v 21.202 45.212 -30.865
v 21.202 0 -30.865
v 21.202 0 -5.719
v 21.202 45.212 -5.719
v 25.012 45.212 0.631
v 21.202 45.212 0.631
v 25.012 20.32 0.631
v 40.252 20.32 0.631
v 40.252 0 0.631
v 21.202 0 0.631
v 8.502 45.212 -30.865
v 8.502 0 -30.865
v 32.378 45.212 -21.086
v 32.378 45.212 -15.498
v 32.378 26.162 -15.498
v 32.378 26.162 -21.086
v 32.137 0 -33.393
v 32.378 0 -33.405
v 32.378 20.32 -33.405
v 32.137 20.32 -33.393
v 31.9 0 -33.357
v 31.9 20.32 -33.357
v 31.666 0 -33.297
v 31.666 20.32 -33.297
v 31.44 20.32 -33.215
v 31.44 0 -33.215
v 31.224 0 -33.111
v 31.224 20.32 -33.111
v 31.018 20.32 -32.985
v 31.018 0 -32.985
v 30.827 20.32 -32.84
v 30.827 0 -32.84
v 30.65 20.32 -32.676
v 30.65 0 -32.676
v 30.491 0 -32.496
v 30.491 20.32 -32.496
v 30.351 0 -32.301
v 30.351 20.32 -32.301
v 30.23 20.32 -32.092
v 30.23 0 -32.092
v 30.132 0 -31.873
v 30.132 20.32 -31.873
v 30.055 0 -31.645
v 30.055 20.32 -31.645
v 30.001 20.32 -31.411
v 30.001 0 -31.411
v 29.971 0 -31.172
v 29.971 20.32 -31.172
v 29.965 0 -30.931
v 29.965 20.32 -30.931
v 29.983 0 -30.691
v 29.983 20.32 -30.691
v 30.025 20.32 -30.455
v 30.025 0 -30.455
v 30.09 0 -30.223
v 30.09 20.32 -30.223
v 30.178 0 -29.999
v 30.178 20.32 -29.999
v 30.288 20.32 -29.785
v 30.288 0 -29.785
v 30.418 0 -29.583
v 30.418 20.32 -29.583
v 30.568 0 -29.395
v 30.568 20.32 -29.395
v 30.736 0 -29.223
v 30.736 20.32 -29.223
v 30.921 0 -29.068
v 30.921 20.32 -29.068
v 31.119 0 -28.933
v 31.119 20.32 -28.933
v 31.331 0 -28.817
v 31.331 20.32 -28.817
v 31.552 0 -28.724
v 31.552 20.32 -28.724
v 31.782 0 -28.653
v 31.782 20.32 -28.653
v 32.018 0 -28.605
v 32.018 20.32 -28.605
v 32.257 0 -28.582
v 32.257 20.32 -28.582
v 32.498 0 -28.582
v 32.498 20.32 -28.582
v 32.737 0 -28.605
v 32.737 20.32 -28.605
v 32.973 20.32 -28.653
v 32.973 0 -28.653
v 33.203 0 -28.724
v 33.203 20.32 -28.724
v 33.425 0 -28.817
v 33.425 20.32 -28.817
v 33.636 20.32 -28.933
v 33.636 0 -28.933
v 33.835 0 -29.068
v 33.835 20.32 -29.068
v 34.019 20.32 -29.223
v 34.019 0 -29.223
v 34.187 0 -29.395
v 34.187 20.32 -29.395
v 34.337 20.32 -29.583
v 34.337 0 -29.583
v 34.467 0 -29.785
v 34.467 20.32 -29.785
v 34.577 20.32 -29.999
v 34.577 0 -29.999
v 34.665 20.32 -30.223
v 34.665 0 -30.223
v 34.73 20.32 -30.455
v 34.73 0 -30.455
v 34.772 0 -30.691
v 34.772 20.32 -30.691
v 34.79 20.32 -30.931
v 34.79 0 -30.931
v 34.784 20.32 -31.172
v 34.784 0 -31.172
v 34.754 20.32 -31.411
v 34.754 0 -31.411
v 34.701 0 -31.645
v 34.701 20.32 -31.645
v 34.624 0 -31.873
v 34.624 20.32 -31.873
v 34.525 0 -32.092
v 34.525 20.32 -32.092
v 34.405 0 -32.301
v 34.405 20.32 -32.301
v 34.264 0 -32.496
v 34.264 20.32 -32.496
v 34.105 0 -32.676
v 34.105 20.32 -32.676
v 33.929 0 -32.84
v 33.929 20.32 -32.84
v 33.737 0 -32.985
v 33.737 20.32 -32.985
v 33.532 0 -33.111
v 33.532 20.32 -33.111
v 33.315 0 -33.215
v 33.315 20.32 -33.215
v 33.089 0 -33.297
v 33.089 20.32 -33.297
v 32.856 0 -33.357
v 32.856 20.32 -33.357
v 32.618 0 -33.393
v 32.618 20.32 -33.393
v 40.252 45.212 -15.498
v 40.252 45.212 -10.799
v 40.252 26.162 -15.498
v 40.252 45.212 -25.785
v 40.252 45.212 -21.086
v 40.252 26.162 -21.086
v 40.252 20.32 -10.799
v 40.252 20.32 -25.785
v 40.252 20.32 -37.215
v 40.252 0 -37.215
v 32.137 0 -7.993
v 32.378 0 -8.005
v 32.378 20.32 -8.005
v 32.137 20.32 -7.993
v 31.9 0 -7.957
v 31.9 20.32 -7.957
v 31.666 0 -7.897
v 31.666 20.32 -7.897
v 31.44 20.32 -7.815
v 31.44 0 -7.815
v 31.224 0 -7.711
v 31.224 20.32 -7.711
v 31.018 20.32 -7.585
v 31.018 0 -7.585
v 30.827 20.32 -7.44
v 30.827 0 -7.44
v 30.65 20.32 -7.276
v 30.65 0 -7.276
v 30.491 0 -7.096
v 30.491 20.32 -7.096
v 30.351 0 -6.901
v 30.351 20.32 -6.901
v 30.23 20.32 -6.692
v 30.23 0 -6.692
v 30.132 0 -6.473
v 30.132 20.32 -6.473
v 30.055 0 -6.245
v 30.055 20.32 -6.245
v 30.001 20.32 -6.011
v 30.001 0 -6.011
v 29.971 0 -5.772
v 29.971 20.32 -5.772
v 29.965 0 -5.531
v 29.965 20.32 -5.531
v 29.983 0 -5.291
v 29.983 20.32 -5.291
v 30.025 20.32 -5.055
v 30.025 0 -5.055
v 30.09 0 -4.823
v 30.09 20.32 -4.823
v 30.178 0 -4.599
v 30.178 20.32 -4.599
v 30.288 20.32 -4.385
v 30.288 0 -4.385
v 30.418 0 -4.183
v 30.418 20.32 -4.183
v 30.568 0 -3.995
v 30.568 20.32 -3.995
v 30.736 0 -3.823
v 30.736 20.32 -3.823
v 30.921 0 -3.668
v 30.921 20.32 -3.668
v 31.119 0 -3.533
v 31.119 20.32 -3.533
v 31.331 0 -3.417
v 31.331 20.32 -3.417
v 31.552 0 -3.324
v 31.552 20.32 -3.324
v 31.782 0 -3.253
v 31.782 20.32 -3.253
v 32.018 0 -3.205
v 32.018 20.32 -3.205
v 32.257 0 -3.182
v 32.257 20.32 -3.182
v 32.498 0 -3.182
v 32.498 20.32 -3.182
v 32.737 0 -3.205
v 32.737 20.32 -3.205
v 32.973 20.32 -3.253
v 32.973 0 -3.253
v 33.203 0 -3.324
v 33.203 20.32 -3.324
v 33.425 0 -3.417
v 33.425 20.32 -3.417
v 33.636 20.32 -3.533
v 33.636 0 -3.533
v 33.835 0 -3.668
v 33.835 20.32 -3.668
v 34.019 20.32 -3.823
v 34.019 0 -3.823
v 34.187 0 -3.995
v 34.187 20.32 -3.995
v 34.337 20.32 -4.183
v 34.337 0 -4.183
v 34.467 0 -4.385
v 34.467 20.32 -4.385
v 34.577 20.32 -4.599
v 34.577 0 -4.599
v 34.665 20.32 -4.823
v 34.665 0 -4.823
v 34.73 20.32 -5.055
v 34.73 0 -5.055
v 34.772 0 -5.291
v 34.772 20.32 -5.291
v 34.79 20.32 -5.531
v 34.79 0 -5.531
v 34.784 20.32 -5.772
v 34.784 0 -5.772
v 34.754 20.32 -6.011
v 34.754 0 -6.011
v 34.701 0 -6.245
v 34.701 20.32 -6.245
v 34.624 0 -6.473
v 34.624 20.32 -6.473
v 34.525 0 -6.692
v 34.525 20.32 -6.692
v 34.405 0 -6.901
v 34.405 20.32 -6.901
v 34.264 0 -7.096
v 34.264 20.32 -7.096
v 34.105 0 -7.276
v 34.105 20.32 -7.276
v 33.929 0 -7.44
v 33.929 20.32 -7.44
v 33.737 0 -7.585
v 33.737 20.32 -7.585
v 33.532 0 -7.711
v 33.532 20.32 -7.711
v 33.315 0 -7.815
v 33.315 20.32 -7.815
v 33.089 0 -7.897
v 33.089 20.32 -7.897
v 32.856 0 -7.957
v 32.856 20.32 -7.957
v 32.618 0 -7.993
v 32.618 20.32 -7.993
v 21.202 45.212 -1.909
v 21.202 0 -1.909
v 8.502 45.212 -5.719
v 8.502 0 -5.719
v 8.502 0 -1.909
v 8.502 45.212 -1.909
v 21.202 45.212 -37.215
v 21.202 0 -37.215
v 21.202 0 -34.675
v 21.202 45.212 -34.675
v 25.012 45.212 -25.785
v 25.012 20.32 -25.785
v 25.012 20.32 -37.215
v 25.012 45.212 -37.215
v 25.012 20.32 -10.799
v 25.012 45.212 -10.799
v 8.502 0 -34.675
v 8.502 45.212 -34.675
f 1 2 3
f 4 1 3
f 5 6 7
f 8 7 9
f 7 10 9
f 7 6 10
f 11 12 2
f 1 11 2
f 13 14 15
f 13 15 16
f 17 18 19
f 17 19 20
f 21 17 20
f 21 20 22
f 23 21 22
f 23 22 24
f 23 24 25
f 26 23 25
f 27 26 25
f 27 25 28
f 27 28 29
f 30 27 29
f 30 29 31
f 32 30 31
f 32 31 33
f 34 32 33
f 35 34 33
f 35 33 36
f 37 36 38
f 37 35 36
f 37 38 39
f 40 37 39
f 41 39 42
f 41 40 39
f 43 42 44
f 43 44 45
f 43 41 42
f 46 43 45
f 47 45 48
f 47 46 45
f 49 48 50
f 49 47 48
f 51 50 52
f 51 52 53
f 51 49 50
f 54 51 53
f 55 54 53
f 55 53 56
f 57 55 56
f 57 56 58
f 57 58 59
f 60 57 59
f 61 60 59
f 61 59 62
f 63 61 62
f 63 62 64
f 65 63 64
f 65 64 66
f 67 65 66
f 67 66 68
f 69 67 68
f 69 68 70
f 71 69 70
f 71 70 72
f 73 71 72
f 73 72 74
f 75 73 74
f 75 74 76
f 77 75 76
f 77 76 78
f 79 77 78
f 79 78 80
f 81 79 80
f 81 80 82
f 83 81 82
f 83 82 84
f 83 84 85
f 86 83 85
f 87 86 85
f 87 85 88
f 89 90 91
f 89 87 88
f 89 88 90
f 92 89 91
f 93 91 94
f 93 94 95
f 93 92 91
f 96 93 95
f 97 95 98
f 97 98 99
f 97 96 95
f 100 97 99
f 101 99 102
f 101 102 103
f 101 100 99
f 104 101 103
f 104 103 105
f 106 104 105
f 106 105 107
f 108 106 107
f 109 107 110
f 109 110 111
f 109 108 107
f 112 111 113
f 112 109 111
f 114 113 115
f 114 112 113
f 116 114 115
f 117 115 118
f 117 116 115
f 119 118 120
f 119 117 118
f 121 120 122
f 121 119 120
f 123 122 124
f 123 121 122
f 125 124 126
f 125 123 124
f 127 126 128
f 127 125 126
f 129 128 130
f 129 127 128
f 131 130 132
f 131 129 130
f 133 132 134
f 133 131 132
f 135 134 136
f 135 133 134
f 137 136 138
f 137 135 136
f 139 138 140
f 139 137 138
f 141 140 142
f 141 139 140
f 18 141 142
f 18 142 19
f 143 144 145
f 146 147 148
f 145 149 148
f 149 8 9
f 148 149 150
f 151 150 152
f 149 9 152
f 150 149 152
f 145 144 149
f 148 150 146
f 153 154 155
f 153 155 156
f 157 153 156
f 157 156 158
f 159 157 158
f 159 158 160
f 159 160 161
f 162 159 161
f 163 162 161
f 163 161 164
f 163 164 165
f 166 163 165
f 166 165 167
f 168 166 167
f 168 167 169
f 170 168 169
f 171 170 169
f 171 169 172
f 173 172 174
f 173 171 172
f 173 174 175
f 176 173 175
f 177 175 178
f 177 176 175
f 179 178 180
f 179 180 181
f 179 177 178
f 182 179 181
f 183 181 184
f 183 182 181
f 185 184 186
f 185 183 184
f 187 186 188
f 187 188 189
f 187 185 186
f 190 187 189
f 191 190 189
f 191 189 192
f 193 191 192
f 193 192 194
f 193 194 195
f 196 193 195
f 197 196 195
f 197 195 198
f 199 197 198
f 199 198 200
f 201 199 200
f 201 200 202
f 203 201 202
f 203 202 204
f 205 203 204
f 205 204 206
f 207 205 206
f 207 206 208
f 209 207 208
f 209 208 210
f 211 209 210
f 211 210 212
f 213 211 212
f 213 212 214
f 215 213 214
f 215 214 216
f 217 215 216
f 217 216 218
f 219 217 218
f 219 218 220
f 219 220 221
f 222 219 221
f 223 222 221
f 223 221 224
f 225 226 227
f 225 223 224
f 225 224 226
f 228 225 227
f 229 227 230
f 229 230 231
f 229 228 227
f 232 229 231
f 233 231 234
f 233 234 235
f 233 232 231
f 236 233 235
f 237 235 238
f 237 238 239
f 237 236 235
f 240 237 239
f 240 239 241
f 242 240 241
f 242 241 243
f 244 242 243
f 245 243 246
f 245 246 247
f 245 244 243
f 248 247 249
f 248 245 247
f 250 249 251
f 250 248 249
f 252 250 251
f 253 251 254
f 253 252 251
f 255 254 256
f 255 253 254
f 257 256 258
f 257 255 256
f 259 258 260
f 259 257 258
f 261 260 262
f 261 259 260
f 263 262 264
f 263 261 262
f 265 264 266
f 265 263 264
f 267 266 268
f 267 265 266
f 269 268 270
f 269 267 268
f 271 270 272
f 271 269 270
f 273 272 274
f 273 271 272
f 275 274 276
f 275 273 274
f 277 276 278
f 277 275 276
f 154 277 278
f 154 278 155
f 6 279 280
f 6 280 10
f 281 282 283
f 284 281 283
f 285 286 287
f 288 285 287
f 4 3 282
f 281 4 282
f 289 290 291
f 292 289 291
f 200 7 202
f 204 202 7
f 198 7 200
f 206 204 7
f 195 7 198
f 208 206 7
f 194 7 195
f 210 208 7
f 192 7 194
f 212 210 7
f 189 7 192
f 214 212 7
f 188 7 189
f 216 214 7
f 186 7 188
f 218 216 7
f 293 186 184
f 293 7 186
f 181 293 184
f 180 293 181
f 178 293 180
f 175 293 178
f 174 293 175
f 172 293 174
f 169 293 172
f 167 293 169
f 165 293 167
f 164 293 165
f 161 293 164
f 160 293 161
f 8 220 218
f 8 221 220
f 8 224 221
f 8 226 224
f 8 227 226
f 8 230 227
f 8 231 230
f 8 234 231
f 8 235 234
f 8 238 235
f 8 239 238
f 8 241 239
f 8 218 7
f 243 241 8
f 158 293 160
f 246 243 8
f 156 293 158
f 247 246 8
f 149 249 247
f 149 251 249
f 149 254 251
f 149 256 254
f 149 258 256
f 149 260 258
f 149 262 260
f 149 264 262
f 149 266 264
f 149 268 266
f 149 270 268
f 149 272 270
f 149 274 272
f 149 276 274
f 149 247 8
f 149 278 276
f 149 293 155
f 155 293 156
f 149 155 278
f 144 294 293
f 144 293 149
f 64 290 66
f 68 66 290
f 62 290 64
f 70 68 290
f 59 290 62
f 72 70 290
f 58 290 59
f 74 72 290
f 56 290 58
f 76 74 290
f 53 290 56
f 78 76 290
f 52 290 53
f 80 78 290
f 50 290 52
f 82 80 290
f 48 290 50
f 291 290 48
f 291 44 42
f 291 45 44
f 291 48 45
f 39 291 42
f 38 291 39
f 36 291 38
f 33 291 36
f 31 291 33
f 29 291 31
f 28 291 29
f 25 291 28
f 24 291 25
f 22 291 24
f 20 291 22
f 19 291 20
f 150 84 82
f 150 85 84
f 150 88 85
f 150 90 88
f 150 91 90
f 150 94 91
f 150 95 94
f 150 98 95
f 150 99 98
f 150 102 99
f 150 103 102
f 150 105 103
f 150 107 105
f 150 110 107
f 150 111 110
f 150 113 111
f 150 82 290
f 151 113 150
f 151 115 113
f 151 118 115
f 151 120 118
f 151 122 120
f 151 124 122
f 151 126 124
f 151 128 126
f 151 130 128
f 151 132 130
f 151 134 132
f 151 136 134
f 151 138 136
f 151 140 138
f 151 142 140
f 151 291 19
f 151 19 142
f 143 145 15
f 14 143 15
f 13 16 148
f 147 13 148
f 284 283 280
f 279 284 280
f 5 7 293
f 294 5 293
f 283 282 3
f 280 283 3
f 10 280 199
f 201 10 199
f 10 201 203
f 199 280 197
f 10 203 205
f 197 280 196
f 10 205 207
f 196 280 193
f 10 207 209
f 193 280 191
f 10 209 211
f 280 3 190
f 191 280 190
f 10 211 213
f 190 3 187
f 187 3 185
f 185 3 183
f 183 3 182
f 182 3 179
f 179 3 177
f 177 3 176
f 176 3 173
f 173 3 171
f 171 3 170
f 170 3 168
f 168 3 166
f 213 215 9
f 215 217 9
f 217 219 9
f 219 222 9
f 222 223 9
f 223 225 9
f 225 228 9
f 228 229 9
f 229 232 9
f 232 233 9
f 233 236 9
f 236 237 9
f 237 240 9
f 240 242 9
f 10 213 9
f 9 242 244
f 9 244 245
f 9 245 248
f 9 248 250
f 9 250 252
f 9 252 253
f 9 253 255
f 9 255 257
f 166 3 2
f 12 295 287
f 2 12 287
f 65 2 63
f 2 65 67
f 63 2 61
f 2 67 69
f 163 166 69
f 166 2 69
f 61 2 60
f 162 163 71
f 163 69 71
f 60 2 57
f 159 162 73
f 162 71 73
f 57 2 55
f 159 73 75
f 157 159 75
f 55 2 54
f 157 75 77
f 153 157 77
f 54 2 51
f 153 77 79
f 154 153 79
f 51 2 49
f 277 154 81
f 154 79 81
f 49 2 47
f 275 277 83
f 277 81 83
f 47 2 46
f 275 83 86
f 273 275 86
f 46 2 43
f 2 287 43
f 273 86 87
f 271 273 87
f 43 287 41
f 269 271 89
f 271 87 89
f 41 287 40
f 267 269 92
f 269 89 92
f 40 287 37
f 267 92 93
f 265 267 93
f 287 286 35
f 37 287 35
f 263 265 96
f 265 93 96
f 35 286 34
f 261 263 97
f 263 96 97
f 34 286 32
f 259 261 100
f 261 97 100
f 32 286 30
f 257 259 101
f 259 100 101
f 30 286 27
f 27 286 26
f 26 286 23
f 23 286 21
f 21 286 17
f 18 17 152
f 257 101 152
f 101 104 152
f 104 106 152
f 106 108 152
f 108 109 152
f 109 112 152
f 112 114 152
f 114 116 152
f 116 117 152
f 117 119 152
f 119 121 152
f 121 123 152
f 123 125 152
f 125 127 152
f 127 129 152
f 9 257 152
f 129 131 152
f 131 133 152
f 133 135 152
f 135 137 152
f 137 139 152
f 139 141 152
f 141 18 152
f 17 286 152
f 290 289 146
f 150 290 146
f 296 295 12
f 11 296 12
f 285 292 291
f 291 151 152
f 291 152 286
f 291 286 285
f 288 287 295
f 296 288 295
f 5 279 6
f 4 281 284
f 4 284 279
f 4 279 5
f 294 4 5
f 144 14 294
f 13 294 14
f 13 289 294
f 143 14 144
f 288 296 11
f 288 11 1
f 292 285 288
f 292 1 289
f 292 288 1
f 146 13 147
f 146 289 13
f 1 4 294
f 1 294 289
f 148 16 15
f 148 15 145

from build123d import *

# Parameters (mm, degrees)
SKETCH1_R           = 2.413
BOSS_EXTRUDE1_DEPTH = 45.212
SKETCH1_4_W         = 7.874
SKETCH1_4_H         = 5.588
BOSS_EXTRUDE2_DEPTH = 26.162
CUT_EXTRUDE1_START  = -24.892
SKETCH2_W           = 15.24
SKETCH2_H           = 11.43
SKETCH2_R           = 2.413
CUT_EXTRUDE1_DEPTH  = 24.892


with BuildPart() as part:
    # Sketch1 → Boss-Extrude1 (new body)
    with BuildSketch(Plane(origin=(0, 0, 0), x_dir=(1, 0, 0), z_dir=(0, 1, 0))):
        Polygon((40.25170153, 21.085507102), (40.25170153, 37.214507102), (21.20170153, 37.214507102), (21.20170153, 34.674507102), (8.50170153, 34.674507102), (8.50170153, 30.864507102), (21.20170153, 30.864507102), (21.20170153, 5.718507102), (8.50170153, 5.718507102), (8.50170153, 1.908507102), (21.20170153, 1.908507102), (21.20170153, -0.631492898), (40.25170153, -0.631492898), (40.25170153, 15.497507102), (32.37770153, 15.497507102), (32.37770153, 21.085507102), align=None)
        with Locations((32.37770153, 30.991507102)):
            Circle(SKETCH1_R, mode=Mode.SUBTRACT)
        with Locations((32.37770153, 5.591507102)):
            Circle(SKETCH1_R, mode=Mode.SUBTRACT)
    extrude(amount=BOSS_EXTRUDE1_DEPTH)

    # Sketch1<4> → Boss-Extrude2 (add)
    with BuildSketch(Plane(origin=(0, 0, 0), x_dir=(1, 0, 0), z_dir=(0, 1, 0))):
        with Locations((36.31470153, 18.291507102)):
            Rectangle(SKETCH1_4_W, SKETCH1_4_H)
    extrude(amount=BOSS_EXTRUDE2_DEPTH)

    # Sketch2 → Cut-Extrude1 (cut)
    # profile 1 of 2: a face of its own
    with BuildSketch(Plane(origin=(0, 45.212, 0), x_dir=(1, 0, 0), z_dir=(0, 1, 0)).offset(CUT_EXTRUDE1_START)):
        with Locations((32.63170153, 31.499507102)):
            Rectangle(SKETCH2_W, SKETCH2_H)
        with Locations((32.37770153, 30.991507102)):
            Circle(SKETCH2_R, mode=Mode.SUBTRACT)
    # profile 2 of 2: a face of its own
    with BuildSketch(Plane(origin=(0, 45.212, 0), x_dir=(1, 0, 0), z_dir=(0, 1, 0)).offset(CUT_EXTRUDE1_START)):
        with Locations((32.63170153, 5.083507102)):
            Rectangle(SKETCH2_W, SKETCH2_H)
        with Locations((32.37770153, 5.591507102)):
            Circle(SKETCH2_R, mode=Mode.SUBTRACT)
    extrude(amount=CUT_EXTRUDE1_DEPTH, mode=Mode.SUBTRACT)


solid = part.part
